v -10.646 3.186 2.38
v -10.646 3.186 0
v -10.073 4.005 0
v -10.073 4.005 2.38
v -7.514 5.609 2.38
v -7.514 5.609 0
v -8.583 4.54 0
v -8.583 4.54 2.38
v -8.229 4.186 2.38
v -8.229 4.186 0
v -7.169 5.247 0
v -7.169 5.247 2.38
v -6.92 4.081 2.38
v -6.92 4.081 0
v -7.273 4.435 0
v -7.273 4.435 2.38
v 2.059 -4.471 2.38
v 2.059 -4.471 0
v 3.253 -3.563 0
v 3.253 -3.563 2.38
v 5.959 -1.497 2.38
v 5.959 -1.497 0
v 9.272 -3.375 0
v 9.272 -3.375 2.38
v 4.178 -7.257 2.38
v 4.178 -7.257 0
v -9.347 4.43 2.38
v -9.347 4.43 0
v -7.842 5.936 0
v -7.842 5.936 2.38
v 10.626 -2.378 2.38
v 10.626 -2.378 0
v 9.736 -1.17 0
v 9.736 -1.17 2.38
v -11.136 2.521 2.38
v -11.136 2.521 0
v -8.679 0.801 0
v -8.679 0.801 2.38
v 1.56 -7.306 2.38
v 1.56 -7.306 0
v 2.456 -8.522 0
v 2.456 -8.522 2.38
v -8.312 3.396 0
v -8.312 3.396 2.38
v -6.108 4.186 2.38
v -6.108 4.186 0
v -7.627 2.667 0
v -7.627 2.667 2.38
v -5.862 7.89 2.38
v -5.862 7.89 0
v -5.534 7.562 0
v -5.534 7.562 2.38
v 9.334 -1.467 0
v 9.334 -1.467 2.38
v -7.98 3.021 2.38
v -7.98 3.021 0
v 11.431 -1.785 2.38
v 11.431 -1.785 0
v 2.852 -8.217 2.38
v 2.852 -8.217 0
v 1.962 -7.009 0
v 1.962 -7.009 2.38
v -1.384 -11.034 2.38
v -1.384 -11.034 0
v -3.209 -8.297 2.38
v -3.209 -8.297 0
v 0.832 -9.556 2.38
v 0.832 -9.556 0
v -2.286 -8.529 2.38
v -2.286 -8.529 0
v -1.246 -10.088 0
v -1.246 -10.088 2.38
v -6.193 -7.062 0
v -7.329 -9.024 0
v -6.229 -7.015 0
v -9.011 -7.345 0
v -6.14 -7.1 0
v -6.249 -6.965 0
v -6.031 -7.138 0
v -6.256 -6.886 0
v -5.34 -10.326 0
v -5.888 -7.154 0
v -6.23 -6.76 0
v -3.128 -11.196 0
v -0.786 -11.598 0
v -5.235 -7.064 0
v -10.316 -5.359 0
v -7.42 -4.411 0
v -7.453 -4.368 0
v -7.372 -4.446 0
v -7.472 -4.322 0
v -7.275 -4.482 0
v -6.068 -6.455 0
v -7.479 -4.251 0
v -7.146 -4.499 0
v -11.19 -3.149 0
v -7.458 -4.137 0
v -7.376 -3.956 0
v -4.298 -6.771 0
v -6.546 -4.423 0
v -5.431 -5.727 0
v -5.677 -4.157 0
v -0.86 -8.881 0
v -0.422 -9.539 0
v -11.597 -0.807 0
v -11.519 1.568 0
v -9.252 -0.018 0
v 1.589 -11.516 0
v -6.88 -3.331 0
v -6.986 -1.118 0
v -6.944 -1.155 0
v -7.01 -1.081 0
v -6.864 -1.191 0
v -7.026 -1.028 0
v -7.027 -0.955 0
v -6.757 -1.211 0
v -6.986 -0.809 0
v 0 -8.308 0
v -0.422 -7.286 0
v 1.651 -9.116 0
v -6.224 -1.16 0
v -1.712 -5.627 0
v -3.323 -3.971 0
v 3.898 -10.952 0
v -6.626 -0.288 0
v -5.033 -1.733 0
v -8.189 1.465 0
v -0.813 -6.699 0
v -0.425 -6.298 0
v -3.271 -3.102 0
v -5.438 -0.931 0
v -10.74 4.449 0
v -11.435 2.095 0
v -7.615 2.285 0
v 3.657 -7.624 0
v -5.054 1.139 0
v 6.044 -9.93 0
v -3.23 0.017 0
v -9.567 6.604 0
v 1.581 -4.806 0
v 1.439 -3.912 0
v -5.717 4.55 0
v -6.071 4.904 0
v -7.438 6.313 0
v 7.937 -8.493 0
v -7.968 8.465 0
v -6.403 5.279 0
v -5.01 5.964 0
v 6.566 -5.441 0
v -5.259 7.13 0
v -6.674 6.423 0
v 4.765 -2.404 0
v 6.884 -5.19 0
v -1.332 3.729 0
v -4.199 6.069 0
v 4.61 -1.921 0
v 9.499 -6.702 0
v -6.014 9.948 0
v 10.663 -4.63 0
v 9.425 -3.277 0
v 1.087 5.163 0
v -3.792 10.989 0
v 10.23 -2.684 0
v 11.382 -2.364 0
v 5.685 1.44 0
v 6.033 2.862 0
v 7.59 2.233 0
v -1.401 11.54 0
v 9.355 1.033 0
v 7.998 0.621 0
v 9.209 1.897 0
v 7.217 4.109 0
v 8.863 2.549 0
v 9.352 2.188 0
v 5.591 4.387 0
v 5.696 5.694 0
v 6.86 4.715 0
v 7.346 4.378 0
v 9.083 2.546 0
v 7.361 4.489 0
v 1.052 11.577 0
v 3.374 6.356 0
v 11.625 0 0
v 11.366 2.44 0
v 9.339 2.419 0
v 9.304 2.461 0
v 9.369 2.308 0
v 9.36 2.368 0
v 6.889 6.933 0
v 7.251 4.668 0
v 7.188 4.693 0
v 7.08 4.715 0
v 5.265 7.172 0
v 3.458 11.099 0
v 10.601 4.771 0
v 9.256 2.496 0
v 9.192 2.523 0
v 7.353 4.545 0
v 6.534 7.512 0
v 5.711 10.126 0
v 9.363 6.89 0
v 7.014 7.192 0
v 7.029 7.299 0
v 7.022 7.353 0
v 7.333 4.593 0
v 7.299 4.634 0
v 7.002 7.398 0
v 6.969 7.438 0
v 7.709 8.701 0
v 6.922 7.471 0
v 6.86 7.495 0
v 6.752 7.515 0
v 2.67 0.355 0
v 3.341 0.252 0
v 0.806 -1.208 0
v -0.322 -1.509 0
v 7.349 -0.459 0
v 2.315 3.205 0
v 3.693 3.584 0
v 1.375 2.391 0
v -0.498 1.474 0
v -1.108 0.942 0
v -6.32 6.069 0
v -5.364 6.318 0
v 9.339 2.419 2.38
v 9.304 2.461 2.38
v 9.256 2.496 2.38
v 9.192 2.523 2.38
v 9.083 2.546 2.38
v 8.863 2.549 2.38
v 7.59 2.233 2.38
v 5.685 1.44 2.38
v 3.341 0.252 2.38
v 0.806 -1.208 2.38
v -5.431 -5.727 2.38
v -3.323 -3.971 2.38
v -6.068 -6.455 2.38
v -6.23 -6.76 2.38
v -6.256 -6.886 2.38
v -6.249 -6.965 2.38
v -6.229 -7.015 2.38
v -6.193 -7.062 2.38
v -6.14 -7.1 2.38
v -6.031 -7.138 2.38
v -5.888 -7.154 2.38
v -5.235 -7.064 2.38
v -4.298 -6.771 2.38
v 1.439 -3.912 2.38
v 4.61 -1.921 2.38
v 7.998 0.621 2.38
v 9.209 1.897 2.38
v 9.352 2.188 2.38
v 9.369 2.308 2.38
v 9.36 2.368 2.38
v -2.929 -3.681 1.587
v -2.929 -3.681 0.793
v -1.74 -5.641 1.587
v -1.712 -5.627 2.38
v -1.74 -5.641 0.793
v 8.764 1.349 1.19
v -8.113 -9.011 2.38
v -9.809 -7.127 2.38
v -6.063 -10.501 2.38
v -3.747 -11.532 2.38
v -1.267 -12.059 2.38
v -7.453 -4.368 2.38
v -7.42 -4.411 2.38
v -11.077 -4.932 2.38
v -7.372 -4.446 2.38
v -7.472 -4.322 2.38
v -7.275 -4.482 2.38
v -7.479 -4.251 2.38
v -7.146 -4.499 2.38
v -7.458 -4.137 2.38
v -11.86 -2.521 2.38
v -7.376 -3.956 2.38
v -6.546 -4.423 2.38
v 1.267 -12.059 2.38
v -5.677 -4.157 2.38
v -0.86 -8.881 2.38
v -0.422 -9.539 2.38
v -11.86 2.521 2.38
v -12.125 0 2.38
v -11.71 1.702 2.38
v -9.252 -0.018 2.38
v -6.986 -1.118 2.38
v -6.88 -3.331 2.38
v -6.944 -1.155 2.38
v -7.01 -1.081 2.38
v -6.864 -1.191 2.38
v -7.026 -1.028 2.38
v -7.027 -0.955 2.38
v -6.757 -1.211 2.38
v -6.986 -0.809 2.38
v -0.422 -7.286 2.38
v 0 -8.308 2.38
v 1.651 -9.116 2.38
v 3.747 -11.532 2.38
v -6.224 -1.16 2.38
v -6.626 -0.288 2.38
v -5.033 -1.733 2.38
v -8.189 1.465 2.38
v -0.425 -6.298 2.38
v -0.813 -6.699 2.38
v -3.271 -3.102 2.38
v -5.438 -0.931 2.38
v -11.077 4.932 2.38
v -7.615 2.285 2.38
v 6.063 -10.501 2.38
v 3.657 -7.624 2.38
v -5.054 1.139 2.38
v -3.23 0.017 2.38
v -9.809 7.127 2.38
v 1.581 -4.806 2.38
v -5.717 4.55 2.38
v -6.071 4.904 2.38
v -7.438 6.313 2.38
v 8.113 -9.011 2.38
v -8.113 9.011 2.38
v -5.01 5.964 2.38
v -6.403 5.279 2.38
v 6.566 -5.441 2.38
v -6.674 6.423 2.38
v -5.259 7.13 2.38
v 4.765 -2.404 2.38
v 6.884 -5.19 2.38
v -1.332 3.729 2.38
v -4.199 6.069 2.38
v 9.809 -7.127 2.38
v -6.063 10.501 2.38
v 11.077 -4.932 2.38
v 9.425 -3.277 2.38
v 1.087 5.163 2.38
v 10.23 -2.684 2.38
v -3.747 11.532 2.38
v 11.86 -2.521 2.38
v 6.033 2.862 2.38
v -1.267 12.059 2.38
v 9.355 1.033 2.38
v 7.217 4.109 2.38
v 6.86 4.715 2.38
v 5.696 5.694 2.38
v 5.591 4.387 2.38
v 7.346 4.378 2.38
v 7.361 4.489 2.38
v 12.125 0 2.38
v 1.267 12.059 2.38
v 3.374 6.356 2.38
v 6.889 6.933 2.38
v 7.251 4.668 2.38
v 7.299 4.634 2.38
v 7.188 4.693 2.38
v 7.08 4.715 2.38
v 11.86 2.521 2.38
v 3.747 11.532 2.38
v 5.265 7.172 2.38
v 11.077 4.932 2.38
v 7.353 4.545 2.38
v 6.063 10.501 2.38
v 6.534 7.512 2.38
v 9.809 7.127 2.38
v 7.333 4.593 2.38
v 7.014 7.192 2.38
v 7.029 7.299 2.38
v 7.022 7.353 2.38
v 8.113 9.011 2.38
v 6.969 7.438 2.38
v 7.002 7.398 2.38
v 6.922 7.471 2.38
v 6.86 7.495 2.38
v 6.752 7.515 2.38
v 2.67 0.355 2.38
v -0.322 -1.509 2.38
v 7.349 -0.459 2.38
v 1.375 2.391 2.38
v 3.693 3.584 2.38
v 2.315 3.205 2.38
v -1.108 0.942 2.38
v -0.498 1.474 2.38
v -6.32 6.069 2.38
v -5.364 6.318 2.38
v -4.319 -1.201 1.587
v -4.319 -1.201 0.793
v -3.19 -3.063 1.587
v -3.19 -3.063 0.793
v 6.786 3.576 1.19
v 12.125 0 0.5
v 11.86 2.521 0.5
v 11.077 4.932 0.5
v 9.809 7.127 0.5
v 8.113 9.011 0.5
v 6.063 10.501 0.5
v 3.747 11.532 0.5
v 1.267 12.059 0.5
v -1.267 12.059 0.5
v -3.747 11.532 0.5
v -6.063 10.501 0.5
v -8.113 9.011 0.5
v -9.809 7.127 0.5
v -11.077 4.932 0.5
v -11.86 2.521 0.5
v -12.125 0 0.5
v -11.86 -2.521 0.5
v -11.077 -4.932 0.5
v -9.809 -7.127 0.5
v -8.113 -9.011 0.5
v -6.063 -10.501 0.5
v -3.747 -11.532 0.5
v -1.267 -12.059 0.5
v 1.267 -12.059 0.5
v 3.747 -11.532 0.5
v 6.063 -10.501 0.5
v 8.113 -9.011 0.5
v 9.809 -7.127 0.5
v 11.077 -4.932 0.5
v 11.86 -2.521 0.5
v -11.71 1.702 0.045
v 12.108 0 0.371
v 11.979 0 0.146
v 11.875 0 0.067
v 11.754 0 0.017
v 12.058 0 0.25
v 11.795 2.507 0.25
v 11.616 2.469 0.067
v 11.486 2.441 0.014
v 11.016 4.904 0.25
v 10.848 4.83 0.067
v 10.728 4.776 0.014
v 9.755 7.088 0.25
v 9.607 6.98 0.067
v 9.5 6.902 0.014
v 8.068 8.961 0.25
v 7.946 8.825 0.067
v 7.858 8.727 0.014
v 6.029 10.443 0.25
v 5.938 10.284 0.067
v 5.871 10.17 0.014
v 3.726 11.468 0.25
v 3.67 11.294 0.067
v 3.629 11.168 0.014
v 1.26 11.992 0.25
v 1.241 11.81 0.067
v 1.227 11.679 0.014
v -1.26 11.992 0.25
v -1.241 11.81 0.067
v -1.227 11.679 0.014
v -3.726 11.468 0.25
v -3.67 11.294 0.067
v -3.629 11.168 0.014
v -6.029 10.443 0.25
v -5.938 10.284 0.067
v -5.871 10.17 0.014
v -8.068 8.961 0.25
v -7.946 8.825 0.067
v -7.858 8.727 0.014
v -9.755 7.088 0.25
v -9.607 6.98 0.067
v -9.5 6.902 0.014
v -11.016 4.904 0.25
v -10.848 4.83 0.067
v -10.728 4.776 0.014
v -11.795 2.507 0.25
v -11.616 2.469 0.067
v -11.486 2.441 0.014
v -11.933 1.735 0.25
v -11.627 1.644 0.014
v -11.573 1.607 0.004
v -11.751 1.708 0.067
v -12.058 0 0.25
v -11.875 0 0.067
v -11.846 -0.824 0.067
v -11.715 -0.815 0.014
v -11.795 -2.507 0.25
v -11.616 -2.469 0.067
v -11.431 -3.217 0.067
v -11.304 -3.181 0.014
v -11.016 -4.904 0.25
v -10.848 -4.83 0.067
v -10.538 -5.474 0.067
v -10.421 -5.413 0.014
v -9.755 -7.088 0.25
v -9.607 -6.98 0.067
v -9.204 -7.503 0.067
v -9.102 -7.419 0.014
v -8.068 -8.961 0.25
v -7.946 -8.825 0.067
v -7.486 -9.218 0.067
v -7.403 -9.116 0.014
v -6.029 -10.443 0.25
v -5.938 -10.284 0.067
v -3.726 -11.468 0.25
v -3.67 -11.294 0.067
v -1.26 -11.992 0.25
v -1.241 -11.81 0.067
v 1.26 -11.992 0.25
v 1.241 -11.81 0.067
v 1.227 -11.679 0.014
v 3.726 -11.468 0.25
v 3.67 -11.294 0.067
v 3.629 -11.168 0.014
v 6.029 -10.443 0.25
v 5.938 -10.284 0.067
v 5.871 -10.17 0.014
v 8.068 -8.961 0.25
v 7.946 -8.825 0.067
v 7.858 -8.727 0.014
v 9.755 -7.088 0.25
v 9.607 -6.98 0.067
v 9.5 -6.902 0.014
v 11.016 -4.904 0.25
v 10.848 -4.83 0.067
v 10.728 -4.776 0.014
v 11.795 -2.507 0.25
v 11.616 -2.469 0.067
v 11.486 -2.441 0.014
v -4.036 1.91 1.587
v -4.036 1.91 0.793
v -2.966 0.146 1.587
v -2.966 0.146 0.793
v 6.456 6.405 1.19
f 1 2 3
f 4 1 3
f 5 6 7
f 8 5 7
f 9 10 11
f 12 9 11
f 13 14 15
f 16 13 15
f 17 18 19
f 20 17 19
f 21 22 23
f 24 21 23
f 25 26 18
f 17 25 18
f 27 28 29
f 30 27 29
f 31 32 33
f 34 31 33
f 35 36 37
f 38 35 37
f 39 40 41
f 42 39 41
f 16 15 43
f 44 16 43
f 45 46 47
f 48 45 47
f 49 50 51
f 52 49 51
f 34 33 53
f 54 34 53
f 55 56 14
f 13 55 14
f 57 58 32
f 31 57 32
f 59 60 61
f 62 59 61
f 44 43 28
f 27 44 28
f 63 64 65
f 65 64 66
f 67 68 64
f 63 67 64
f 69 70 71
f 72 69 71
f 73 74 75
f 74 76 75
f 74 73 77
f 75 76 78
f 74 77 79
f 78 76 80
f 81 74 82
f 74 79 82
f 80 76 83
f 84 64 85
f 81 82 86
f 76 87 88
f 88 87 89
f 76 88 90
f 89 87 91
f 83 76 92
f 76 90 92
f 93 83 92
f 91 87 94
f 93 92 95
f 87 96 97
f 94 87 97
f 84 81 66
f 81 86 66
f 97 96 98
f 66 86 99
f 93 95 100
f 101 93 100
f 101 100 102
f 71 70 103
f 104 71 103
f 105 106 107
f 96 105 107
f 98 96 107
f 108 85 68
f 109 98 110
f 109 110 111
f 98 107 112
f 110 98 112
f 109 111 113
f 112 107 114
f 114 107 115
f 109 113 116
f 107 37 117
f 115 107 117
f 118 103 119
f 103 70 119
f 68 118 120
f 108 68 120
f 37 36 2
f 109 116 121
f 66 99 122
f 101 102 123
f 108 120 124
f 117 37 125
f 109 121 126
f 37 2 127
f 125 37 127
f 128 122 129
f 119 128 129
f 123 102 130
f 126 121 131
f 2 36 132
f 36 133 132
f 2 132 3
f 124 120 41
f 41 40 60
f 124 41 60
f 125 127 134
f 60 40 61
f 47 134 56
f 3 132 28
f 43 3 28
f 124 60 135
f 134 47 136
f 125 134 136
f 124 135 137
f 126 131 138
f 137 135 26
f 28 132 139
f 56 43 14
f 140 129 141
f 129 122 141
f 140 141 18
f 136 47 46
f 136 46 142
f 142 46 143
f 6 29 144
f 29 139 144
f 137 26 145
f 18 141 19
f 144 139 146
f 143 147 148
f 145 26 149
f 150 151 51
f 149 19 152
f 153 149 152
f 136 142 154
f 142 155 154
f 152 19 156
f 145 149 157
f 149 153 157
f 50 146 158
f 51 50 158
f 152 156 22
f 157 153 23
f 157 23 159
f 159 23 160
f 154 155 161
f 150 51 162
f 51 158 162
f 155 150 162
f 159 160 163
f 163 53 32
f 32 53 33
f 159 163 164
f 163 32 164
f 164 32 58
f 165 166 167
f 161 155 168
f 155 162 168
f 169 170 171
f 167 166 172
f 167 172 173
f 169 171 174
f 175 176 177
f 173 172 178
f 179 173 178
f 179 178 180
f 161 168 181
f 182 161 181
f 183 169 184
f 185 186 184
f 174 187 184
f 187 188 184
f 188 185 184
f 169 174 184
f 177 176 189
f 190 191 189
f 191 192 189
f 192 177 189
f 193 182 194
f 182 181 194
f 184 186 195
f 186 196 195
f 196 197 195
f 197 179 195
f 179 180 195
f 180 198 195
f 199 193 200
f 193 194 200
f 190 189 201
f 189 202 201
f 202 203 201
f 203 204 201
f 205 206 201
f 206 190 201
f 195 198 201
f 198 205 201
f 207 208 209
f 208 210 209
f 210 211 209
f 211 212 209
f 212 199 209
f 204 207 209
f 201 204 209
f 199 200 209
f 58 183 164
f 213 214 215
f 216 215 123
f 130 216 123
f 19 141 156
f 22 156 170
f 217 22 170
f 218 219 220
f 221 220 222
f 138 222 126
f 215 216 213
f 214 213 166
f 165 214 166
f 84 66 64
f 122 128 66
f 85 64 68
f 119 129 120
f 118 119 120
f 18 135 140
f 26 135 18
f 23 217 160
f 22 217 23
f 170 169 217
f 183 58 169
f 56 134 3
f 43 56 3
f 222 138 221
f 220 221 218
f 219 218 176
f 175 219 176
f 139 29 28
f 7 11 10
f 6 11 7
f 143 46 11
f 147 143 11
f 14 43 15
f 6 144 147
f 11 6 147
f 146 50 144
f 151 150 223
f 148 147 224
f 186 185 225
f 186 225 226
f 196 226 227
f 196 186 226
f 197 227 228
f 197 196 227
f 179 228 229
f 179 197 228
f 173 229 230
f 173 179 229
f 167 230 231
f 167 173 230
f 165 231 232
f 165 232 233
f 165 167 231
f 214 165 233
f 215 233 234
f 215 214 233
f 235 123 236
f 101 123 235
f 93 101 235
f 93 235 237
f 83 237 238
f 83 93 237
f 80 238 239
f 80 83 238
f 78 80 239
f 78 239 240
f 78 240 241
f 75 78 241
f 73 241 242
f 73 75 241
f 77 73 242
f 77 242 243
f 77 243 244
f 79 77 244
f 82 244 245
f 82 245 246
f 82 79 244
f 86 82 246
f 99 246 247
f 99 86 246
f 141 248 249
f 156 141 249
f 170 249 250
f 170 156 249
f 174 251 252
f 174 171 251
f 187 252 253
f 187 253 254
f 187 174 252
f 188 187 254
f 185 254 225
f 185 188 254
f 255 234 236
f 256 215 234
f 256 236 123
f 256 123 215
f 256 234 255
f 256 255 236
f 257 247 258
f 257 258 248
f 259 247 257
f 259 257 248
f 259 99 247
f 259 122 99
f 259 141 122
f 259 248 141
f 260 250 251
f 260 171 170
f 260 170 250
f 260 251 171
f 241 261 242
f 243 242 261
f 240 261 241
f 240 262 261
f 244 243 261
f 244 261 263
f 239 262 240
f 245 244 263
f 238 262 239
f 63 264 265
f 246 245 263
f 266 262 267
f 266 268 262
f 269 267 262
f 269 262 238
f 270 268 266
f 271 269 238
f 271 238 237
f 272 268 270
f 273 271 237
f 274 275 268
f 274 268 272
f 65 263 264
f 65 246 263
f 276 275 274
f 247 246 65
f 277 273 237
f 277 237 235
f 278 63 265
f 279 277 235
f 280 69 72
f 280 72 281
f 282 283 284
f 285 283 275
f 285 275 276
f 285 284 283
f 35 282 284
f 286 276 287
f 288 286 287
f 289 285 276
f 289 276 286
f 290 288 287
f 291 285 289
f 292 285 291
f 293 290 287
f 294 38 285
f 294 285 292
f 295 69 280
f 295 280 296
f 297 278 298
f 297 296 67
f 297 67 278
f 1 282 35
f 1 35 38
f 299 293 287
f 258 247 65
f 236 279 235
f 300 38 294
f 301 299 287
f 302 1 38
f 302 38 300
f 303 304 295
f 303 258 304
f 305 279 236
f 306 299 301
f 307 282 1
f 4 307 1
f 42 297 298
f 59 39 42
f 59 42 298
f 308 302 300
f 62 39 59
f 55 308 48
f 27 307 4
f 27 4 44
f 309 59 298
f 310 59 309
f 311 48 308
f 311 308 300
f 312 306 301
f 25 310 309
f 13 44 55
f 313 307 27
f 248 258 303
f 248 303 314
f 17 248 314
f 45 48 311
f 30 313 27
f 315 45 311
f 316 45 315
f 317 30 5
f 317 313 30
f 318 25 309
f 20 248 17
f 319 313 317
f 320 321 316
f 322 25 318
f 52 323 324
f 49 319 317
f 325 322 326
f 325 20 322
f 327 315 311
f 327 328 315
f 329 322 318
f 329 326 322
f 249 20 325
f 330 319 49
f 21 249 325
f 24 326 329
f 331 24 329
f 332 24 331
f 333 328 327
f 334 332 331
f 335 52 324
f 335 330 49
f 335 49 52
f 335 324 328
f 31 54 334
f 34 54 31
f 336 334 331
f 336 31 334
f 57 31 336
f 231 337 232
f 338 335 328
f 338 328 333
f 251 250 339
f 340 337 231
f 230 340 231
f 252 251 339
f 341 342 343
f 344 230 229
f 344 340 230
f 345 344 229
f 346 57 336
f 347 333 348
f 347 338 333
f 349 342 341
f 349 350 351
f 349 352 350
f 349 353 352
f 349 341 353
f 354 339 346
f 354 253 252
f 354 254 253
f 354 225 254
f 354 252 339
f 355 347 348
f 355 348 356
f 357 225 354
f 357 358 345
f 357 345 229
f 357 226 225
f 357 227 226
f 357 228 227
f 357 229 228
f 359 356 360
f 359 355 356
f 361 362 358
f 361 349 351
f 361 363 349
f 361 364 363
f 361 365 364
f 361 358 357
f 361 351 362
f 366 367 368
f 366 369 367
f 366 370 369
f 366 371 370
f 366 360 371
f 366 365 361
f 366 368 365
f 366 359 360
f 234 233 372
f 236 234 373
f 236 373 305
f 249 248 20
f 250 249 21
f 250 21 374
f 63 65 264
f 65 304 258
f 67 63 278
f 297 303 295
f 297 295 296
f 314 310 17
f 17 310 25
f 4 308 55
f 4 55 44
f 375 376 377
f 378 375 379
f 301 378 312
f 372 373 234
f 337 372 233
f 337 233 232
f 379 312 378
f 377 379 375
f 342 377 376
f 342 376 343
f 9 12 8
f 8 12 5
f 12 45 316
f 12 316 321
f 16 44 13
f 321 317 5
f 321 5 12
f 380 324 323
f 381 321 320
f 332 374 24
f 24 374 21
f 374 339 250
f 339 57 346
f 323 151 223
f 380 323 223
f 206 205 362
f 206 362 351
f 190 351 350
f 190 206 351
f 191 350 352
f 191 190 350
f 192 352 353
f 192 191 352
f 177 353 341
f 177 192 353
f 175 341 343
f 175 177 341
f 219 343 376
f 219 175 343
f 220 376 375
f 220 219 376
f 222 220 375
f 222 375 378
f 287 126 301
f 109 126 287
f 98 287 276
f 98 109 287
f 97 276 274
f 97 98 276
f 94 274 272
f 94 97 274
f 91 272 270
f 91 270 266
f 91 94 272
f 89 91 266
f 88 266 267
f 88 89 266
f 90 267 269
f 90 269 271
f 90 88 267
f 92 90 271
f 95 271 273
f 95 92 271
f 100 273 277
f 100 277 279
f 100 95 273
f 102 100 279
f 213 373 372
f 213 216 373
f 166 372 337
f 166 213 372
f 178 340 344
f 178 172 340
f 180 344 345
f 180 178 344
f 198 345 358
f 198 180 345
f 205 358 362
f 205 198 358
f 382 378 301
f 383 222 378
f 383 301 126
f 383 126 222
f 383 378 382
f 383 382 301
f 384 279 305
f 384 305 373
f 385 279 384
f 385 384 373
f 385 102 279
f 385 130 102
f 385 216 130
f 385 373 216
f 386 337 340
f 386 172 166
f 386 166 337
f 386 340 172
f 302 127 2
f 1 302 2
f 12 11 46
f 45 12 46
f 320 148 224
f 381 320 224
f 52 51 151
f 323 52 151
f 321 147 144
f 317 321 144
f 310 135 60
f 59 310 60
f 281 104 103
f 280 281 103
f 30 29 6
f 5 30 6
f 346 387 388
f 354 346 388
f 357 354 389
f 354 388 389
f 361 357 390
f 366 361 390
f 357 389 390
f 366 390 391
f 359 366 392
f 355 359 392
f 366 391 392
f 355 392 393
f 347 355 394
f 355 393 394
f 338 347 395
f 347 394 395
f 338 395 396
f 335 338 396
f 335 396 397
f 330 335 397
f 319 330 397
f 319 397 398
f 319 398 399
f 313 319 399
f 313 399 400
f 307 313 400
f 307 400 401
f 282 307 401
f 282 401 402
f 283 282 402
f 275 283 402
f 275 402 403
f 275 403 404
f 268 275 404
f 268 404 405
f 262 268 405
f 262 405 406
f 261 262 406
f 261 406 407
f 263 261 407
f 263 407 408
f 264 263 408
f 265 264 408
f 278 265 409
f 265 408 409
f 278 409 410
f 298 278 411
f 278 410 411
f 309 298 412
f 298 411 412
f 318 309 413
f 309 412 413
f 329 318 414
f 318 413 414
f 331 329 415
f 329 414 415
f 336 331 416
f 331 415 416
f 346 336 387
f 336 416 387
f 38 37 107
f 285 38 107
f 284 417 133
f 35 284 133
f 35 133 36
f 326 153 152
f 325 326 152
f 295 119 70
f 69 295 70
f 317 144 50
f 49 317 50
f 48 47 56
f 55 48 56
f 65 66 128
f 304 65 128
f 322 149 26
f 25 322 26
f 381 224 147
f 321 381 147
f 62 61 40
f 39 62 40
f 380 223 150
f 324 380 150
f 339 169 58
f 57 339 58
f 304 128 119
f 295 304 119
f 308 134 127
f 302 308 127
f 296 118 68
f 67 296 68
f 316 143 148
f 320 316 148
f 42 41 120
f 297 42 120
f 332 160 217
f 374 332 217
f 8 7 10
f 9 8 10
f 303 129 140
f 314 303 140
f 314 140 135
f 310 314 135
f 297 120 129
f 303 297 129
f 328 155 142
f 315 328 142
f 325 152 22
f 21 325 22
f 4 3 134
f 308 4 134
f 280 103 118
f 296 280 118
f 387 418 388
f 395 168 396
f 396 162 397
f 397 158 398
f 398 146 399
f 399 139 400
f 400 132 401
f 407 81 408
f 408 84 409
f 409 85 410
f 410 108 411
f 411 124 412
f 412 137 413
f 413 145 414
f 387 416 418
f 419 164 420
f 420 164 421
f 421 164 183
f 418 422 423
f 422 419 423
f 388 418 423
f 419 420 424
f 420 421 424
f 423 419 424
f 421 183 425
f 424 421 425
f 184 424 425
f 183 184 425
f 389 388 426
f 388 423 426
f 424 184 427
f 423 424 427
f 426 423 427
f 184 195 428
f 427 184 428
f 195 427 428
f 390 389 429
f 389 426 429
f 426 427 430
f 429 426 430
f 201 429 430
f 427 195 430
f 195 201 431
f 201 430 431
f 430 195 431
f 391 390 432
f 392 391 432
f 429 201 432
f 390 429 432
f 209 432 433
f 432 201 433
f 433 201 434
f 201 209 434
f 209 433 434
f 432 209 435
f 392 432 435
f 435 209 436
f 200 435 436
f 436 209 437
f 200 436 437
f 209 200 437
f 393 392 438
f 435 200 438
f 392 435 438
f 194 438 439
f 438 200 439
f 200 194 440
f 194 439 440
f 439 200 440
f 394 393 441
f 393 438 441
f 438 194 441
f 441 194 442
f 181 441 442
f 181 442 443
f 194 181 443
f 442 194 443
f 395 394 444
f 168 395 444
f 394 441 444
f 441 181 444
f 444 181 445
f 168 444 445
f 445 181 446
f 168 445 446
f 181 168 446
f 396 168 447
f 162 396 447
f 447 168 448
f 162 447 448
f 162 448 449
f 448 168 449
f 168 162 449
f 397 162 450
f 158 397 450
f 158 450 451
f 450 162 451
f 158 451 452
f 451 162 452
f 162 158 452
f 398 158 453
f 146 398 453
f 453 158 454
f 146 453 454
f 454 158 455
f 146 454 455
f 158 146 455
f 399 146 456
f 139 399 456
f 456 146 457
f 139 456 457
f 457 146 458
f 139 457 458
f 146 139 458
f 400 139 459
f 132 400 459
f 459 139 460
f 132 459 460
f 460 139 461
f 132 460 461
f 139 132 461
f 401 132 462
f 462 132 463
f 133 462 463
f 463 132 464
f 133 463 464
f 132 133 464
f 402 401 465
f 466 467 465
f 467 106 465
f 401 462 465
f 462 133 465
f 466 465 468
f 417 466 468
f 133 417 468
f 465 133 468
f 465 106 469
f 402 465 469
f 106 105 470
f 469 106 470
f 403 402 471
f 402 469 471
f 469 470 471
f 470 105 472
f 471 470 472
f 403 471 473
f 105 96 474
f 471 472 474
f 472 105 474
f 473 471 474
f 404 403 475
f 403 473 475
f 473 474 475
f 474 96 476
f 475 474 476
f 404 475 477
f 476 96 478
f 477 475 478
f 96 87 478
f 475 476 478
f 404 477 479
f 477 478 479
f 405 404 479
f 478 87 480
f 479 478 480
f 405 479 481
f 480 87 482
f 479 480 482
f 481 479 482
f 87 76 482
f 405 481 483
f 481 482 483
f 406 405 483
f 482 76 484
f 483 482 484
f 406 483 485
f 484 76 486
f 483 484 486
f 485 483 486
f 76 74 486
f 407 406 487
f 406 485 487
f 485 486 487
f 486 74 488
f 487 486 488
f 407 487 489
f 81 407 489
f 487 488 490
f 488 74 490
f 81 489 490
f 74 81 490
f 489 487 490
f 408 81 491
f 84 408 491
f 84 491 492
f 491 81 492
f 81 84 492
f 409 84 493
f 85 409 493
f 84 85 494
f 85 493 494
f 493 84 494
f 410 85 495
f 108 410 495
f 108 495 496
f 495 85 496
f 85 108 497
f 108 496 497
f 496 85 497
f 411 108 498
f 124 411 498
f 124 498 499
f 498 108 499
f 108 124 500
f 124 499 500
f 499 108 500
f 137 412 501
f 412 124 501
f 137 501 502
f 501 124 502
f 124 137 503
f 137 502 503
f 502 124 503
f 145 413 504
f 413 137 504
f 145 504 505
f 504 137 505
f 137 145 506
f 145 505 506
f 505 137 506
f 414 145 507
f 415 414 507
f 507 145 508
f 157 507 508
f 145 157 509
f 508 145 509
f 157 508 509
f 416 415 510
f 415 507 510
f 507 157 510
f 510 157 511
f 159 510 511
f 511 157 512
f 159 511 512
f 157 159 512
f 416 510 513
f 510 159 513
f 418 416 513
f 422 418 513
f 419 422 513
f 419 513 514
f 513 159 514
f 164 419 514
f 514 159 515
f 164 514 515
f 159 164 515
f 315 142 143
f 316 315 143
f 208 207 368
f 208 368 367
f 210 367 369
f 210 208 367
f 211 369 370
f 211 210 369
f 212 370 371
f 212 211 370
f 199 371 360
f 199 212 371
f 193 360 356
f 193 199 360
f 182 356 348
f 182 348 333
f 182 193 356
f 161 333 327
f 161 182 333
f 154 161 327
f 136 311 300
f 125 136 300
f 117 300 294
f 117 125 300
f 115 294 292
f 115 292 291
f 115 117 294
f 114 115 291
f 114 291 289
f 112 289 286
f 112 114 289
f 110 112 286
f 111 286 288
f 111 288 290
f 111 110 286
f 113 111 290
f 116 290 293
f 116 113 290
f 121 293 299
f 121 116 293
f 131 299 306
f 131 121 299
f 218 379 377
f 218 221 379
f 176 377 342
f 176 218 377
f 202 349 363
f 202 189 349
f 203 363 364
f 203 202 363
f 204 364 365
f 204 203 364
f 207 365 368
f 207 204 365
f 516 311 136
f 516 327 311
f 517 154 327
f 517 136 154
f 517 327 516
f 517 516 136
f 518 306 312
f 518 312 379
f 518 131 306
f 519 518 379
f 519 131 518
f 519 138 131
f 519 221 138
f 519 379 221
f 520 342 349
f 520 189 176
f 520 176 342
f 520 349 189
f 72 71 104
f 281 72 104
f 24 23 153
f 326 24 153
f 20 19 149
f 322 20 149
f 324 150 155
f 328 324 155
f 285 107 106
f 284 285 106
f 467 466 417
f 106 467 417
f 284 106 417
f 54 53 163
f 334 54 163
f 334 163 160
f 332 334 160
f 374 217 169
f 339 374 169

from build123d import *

# Parameters (mm, degrees)
F0_R     = 12.125
F2_DEPTH = 2.38


# Not quite as in the source:
# - a fillet or chamfer that OpenCascade refuses, or shapes differently, is made with other operations: its cross-section is extruded or revolved along the edge and cut away or added


with BuildPart() as f2:
    # F0 (on Top) → F2 (new body)
    with BuildSketch(Plane.XY):
        Circle(F0_R)
        Polygon((-3.2093067312, -8.296926559), (-0.8131807139, -6.6990929169), (-0.4216222868, -7.2856470722), (-2.2859056129, -8.5288265191), (-1.2460206689, -10.08824754), (-0.4216222869, -9.5385053896), (-0.8599218546, -8.8812273288), (0, -8.3077966916), (0.8322003947, -9.5557720532), (-1.3842535445, -11.0337930941), align=None, mode=Mode.SUBTRACT)
        Polygon((2.4562833268, -8.5223700524), (1.651227667, -9.1155693314), (-0.4249698094, -6.2978745219), (1.5810172705, -4.8058485212), (3.6572147468, -7.6235433307), (2.852159087, -8.2167426096), (1.9623601685, -7.0091591199), (1.5598323386, -7.3057587593), align=None, mode=Mode.SUBTRACT)
        Polygon((6.5659907646, -5.4407012337), (4.1779835818, -7.2565816525), (2.0594564267, -4.4705732726), (3.253460018, -3.5626330632), align=None, mode=Mode.SUBTRACT)
        with BuildLine():
            add(Edge.make_bspline(
                [(9.3386698082, 2.4187678684), (8.1497764129, 4.3790980975), (-2.9293388718, -3.6808031421), (-14.0084541566, -11.7407043817), (-1.7404454766, -5.6411333711), (10.5275632034, 0.4584376394), (9.3386698082, 2.4187678684)],
                knots=[0, 0, 0, 2.0943951024, 2.0943951024, 4.1887902048, 4.1887902048, 6.2831853072, 6.2831853072, 6.2831853072], degree=2, weights=[1, 0.5, 1, 0.5, 1, 0.5, 1]))
        make_face(mode=Mode.SUBTRACT)
        Polygon((9.2717871239, -3.3746159405), (6.8837799411, -5.1904963592), (4.7652527859, -2.4044879793), (5.9592563773, -1.49654777), align=None, mode=Mode.SUBTRACT)
        Polygon((10.230396352, -2.6835796259), (9.4253406921, -3.2767789049), (7.3491432158, -0.4590840954), (9.3551302956, 1.0329419053), (11.431327772, -1.7847529042), (10.6262721121, -2.3779521831), (9.7364731937, -1.1703686933), (9.3339453638, -1.4669683328), align=None, mode=Mode.SUBTRACT)
        Polygon((-9.252220741, -0.0182491862), (-11.7099159868, 1.7021385838), (-11.1364533968, 2.5213703323), (-8.678758151, 0.8009825624), align=None, mode=Mode.SUBTRACT)
        Polygon((-8.1887295845, 1.4652768326), (-10.6464248303, 3.1856646026), (-10.0729622403, 4.0048963511), (-7.6152669945, 2.2845085812), align=None, mode=Mode.SUBTRACT)
        Polygon((-9.347300169, 4.430499518), (-7.841588868, 5.936210455), (-7.5140006084, 5.6086221162), (-8.5829520327, 4.5396709503), (-8.2293986849, 4.186117517), (-7.1687383849, 5.2467775605), (-6.1080785977, 4.186117517), (-7.6266925716, 2.6671674091), (-7.9802459194, 3.0207208425), (-6.9195856195, 4.0813808861), (-7.2731389673, 4.4349343194), (-8.3124372196, 3.3956363184), align=None, mode=Mode.SUBTRACT)
        with BuildLine():
            add(Edge.make_bspline(
                [(7.3327392075, 4.5926569432), (6.2035325254, 6.4545715628), (-4.3193714297, -1.2006937226), (-14.8422753849, -8.855959008), (-3.1901647477, -3.0626083422), (8.4619458895, 2.7307423236), (7.3327392075, 4.5926569432)],
                knots=[0, 0, 0, 2.0943951024, 2.0943951024, 4.1887902048, 4.1887902048, 6.2831853072, 6.2831853072, 6.2831853072], degree=2, weights=[1, 0.5, 1, 0.5, 1, 0.5, 1]))
        make_face(mode=Mode.SUBTRACT)
        Polygon((-7.4380451802, 6.3134137932), (-5.8618537193, 7.8896048731), (-5.5342654597, 7.5620165344), (-6.6736970439, 6.4225852256), (-6.320143696, 6.0690317922), (-5.2594833961, 7.1296918358), (-4.1988236089, 6.0690317922), (-5.7174375827, 4.5500816844), (-6.0709909306, 4.9036351177), (-5.0103306306, 5.9642951613), (-5.3638839785, 6.3178485947), (-6.4031822307, 5.2785505936), align=None, mode=Mode.SUBTRACT)
        with BuildLine():
            add(Edge.make_bspline(
                [(7.0022831521, 7.3981736055), (5.9325623329, 9.1620037916), (-4.0360019856, 1.9100128299), (-14.0045663042, -5.3419781317), (-2.9662811665, 0.1461826439), (8.0720039713, 5.6343434195), (7.0022831521, 7.3981736055)],
                knots=[0, 0, 0, 2.0943951024, 2.0943951024, 4.1887902048, 4.1887902048, 6.2831853072, 6.2831853072, 6.2831853072], degree=2, weights=[1, 0.5, 1, 0.5, 1, 0.5, 1]))
        make_face(mode=Mode.SUBTRACT)
    extrude(amount=F2_DEPTH)

    # F3: fillet of radius 0.5 on 1 edges, made by hand

    # F3_s1 → F3_t2 (revolve, cut)
    with BuildSketch(Plane.XZ):
        with BuildLine():
            ThreePointArc((12.125, 0.5), (11.9785533906, 0.1464466094), (11.625, 0))
            Line((11.625, 0), (12.125, 0))
            Line((12.125, 0), (12.125, 0.5))
        make_face()
    revolve(axis=Axis((0, 0, 0), (0, 0, 1)), mode=Mode.SUBTRACT)


solid = f2.part
